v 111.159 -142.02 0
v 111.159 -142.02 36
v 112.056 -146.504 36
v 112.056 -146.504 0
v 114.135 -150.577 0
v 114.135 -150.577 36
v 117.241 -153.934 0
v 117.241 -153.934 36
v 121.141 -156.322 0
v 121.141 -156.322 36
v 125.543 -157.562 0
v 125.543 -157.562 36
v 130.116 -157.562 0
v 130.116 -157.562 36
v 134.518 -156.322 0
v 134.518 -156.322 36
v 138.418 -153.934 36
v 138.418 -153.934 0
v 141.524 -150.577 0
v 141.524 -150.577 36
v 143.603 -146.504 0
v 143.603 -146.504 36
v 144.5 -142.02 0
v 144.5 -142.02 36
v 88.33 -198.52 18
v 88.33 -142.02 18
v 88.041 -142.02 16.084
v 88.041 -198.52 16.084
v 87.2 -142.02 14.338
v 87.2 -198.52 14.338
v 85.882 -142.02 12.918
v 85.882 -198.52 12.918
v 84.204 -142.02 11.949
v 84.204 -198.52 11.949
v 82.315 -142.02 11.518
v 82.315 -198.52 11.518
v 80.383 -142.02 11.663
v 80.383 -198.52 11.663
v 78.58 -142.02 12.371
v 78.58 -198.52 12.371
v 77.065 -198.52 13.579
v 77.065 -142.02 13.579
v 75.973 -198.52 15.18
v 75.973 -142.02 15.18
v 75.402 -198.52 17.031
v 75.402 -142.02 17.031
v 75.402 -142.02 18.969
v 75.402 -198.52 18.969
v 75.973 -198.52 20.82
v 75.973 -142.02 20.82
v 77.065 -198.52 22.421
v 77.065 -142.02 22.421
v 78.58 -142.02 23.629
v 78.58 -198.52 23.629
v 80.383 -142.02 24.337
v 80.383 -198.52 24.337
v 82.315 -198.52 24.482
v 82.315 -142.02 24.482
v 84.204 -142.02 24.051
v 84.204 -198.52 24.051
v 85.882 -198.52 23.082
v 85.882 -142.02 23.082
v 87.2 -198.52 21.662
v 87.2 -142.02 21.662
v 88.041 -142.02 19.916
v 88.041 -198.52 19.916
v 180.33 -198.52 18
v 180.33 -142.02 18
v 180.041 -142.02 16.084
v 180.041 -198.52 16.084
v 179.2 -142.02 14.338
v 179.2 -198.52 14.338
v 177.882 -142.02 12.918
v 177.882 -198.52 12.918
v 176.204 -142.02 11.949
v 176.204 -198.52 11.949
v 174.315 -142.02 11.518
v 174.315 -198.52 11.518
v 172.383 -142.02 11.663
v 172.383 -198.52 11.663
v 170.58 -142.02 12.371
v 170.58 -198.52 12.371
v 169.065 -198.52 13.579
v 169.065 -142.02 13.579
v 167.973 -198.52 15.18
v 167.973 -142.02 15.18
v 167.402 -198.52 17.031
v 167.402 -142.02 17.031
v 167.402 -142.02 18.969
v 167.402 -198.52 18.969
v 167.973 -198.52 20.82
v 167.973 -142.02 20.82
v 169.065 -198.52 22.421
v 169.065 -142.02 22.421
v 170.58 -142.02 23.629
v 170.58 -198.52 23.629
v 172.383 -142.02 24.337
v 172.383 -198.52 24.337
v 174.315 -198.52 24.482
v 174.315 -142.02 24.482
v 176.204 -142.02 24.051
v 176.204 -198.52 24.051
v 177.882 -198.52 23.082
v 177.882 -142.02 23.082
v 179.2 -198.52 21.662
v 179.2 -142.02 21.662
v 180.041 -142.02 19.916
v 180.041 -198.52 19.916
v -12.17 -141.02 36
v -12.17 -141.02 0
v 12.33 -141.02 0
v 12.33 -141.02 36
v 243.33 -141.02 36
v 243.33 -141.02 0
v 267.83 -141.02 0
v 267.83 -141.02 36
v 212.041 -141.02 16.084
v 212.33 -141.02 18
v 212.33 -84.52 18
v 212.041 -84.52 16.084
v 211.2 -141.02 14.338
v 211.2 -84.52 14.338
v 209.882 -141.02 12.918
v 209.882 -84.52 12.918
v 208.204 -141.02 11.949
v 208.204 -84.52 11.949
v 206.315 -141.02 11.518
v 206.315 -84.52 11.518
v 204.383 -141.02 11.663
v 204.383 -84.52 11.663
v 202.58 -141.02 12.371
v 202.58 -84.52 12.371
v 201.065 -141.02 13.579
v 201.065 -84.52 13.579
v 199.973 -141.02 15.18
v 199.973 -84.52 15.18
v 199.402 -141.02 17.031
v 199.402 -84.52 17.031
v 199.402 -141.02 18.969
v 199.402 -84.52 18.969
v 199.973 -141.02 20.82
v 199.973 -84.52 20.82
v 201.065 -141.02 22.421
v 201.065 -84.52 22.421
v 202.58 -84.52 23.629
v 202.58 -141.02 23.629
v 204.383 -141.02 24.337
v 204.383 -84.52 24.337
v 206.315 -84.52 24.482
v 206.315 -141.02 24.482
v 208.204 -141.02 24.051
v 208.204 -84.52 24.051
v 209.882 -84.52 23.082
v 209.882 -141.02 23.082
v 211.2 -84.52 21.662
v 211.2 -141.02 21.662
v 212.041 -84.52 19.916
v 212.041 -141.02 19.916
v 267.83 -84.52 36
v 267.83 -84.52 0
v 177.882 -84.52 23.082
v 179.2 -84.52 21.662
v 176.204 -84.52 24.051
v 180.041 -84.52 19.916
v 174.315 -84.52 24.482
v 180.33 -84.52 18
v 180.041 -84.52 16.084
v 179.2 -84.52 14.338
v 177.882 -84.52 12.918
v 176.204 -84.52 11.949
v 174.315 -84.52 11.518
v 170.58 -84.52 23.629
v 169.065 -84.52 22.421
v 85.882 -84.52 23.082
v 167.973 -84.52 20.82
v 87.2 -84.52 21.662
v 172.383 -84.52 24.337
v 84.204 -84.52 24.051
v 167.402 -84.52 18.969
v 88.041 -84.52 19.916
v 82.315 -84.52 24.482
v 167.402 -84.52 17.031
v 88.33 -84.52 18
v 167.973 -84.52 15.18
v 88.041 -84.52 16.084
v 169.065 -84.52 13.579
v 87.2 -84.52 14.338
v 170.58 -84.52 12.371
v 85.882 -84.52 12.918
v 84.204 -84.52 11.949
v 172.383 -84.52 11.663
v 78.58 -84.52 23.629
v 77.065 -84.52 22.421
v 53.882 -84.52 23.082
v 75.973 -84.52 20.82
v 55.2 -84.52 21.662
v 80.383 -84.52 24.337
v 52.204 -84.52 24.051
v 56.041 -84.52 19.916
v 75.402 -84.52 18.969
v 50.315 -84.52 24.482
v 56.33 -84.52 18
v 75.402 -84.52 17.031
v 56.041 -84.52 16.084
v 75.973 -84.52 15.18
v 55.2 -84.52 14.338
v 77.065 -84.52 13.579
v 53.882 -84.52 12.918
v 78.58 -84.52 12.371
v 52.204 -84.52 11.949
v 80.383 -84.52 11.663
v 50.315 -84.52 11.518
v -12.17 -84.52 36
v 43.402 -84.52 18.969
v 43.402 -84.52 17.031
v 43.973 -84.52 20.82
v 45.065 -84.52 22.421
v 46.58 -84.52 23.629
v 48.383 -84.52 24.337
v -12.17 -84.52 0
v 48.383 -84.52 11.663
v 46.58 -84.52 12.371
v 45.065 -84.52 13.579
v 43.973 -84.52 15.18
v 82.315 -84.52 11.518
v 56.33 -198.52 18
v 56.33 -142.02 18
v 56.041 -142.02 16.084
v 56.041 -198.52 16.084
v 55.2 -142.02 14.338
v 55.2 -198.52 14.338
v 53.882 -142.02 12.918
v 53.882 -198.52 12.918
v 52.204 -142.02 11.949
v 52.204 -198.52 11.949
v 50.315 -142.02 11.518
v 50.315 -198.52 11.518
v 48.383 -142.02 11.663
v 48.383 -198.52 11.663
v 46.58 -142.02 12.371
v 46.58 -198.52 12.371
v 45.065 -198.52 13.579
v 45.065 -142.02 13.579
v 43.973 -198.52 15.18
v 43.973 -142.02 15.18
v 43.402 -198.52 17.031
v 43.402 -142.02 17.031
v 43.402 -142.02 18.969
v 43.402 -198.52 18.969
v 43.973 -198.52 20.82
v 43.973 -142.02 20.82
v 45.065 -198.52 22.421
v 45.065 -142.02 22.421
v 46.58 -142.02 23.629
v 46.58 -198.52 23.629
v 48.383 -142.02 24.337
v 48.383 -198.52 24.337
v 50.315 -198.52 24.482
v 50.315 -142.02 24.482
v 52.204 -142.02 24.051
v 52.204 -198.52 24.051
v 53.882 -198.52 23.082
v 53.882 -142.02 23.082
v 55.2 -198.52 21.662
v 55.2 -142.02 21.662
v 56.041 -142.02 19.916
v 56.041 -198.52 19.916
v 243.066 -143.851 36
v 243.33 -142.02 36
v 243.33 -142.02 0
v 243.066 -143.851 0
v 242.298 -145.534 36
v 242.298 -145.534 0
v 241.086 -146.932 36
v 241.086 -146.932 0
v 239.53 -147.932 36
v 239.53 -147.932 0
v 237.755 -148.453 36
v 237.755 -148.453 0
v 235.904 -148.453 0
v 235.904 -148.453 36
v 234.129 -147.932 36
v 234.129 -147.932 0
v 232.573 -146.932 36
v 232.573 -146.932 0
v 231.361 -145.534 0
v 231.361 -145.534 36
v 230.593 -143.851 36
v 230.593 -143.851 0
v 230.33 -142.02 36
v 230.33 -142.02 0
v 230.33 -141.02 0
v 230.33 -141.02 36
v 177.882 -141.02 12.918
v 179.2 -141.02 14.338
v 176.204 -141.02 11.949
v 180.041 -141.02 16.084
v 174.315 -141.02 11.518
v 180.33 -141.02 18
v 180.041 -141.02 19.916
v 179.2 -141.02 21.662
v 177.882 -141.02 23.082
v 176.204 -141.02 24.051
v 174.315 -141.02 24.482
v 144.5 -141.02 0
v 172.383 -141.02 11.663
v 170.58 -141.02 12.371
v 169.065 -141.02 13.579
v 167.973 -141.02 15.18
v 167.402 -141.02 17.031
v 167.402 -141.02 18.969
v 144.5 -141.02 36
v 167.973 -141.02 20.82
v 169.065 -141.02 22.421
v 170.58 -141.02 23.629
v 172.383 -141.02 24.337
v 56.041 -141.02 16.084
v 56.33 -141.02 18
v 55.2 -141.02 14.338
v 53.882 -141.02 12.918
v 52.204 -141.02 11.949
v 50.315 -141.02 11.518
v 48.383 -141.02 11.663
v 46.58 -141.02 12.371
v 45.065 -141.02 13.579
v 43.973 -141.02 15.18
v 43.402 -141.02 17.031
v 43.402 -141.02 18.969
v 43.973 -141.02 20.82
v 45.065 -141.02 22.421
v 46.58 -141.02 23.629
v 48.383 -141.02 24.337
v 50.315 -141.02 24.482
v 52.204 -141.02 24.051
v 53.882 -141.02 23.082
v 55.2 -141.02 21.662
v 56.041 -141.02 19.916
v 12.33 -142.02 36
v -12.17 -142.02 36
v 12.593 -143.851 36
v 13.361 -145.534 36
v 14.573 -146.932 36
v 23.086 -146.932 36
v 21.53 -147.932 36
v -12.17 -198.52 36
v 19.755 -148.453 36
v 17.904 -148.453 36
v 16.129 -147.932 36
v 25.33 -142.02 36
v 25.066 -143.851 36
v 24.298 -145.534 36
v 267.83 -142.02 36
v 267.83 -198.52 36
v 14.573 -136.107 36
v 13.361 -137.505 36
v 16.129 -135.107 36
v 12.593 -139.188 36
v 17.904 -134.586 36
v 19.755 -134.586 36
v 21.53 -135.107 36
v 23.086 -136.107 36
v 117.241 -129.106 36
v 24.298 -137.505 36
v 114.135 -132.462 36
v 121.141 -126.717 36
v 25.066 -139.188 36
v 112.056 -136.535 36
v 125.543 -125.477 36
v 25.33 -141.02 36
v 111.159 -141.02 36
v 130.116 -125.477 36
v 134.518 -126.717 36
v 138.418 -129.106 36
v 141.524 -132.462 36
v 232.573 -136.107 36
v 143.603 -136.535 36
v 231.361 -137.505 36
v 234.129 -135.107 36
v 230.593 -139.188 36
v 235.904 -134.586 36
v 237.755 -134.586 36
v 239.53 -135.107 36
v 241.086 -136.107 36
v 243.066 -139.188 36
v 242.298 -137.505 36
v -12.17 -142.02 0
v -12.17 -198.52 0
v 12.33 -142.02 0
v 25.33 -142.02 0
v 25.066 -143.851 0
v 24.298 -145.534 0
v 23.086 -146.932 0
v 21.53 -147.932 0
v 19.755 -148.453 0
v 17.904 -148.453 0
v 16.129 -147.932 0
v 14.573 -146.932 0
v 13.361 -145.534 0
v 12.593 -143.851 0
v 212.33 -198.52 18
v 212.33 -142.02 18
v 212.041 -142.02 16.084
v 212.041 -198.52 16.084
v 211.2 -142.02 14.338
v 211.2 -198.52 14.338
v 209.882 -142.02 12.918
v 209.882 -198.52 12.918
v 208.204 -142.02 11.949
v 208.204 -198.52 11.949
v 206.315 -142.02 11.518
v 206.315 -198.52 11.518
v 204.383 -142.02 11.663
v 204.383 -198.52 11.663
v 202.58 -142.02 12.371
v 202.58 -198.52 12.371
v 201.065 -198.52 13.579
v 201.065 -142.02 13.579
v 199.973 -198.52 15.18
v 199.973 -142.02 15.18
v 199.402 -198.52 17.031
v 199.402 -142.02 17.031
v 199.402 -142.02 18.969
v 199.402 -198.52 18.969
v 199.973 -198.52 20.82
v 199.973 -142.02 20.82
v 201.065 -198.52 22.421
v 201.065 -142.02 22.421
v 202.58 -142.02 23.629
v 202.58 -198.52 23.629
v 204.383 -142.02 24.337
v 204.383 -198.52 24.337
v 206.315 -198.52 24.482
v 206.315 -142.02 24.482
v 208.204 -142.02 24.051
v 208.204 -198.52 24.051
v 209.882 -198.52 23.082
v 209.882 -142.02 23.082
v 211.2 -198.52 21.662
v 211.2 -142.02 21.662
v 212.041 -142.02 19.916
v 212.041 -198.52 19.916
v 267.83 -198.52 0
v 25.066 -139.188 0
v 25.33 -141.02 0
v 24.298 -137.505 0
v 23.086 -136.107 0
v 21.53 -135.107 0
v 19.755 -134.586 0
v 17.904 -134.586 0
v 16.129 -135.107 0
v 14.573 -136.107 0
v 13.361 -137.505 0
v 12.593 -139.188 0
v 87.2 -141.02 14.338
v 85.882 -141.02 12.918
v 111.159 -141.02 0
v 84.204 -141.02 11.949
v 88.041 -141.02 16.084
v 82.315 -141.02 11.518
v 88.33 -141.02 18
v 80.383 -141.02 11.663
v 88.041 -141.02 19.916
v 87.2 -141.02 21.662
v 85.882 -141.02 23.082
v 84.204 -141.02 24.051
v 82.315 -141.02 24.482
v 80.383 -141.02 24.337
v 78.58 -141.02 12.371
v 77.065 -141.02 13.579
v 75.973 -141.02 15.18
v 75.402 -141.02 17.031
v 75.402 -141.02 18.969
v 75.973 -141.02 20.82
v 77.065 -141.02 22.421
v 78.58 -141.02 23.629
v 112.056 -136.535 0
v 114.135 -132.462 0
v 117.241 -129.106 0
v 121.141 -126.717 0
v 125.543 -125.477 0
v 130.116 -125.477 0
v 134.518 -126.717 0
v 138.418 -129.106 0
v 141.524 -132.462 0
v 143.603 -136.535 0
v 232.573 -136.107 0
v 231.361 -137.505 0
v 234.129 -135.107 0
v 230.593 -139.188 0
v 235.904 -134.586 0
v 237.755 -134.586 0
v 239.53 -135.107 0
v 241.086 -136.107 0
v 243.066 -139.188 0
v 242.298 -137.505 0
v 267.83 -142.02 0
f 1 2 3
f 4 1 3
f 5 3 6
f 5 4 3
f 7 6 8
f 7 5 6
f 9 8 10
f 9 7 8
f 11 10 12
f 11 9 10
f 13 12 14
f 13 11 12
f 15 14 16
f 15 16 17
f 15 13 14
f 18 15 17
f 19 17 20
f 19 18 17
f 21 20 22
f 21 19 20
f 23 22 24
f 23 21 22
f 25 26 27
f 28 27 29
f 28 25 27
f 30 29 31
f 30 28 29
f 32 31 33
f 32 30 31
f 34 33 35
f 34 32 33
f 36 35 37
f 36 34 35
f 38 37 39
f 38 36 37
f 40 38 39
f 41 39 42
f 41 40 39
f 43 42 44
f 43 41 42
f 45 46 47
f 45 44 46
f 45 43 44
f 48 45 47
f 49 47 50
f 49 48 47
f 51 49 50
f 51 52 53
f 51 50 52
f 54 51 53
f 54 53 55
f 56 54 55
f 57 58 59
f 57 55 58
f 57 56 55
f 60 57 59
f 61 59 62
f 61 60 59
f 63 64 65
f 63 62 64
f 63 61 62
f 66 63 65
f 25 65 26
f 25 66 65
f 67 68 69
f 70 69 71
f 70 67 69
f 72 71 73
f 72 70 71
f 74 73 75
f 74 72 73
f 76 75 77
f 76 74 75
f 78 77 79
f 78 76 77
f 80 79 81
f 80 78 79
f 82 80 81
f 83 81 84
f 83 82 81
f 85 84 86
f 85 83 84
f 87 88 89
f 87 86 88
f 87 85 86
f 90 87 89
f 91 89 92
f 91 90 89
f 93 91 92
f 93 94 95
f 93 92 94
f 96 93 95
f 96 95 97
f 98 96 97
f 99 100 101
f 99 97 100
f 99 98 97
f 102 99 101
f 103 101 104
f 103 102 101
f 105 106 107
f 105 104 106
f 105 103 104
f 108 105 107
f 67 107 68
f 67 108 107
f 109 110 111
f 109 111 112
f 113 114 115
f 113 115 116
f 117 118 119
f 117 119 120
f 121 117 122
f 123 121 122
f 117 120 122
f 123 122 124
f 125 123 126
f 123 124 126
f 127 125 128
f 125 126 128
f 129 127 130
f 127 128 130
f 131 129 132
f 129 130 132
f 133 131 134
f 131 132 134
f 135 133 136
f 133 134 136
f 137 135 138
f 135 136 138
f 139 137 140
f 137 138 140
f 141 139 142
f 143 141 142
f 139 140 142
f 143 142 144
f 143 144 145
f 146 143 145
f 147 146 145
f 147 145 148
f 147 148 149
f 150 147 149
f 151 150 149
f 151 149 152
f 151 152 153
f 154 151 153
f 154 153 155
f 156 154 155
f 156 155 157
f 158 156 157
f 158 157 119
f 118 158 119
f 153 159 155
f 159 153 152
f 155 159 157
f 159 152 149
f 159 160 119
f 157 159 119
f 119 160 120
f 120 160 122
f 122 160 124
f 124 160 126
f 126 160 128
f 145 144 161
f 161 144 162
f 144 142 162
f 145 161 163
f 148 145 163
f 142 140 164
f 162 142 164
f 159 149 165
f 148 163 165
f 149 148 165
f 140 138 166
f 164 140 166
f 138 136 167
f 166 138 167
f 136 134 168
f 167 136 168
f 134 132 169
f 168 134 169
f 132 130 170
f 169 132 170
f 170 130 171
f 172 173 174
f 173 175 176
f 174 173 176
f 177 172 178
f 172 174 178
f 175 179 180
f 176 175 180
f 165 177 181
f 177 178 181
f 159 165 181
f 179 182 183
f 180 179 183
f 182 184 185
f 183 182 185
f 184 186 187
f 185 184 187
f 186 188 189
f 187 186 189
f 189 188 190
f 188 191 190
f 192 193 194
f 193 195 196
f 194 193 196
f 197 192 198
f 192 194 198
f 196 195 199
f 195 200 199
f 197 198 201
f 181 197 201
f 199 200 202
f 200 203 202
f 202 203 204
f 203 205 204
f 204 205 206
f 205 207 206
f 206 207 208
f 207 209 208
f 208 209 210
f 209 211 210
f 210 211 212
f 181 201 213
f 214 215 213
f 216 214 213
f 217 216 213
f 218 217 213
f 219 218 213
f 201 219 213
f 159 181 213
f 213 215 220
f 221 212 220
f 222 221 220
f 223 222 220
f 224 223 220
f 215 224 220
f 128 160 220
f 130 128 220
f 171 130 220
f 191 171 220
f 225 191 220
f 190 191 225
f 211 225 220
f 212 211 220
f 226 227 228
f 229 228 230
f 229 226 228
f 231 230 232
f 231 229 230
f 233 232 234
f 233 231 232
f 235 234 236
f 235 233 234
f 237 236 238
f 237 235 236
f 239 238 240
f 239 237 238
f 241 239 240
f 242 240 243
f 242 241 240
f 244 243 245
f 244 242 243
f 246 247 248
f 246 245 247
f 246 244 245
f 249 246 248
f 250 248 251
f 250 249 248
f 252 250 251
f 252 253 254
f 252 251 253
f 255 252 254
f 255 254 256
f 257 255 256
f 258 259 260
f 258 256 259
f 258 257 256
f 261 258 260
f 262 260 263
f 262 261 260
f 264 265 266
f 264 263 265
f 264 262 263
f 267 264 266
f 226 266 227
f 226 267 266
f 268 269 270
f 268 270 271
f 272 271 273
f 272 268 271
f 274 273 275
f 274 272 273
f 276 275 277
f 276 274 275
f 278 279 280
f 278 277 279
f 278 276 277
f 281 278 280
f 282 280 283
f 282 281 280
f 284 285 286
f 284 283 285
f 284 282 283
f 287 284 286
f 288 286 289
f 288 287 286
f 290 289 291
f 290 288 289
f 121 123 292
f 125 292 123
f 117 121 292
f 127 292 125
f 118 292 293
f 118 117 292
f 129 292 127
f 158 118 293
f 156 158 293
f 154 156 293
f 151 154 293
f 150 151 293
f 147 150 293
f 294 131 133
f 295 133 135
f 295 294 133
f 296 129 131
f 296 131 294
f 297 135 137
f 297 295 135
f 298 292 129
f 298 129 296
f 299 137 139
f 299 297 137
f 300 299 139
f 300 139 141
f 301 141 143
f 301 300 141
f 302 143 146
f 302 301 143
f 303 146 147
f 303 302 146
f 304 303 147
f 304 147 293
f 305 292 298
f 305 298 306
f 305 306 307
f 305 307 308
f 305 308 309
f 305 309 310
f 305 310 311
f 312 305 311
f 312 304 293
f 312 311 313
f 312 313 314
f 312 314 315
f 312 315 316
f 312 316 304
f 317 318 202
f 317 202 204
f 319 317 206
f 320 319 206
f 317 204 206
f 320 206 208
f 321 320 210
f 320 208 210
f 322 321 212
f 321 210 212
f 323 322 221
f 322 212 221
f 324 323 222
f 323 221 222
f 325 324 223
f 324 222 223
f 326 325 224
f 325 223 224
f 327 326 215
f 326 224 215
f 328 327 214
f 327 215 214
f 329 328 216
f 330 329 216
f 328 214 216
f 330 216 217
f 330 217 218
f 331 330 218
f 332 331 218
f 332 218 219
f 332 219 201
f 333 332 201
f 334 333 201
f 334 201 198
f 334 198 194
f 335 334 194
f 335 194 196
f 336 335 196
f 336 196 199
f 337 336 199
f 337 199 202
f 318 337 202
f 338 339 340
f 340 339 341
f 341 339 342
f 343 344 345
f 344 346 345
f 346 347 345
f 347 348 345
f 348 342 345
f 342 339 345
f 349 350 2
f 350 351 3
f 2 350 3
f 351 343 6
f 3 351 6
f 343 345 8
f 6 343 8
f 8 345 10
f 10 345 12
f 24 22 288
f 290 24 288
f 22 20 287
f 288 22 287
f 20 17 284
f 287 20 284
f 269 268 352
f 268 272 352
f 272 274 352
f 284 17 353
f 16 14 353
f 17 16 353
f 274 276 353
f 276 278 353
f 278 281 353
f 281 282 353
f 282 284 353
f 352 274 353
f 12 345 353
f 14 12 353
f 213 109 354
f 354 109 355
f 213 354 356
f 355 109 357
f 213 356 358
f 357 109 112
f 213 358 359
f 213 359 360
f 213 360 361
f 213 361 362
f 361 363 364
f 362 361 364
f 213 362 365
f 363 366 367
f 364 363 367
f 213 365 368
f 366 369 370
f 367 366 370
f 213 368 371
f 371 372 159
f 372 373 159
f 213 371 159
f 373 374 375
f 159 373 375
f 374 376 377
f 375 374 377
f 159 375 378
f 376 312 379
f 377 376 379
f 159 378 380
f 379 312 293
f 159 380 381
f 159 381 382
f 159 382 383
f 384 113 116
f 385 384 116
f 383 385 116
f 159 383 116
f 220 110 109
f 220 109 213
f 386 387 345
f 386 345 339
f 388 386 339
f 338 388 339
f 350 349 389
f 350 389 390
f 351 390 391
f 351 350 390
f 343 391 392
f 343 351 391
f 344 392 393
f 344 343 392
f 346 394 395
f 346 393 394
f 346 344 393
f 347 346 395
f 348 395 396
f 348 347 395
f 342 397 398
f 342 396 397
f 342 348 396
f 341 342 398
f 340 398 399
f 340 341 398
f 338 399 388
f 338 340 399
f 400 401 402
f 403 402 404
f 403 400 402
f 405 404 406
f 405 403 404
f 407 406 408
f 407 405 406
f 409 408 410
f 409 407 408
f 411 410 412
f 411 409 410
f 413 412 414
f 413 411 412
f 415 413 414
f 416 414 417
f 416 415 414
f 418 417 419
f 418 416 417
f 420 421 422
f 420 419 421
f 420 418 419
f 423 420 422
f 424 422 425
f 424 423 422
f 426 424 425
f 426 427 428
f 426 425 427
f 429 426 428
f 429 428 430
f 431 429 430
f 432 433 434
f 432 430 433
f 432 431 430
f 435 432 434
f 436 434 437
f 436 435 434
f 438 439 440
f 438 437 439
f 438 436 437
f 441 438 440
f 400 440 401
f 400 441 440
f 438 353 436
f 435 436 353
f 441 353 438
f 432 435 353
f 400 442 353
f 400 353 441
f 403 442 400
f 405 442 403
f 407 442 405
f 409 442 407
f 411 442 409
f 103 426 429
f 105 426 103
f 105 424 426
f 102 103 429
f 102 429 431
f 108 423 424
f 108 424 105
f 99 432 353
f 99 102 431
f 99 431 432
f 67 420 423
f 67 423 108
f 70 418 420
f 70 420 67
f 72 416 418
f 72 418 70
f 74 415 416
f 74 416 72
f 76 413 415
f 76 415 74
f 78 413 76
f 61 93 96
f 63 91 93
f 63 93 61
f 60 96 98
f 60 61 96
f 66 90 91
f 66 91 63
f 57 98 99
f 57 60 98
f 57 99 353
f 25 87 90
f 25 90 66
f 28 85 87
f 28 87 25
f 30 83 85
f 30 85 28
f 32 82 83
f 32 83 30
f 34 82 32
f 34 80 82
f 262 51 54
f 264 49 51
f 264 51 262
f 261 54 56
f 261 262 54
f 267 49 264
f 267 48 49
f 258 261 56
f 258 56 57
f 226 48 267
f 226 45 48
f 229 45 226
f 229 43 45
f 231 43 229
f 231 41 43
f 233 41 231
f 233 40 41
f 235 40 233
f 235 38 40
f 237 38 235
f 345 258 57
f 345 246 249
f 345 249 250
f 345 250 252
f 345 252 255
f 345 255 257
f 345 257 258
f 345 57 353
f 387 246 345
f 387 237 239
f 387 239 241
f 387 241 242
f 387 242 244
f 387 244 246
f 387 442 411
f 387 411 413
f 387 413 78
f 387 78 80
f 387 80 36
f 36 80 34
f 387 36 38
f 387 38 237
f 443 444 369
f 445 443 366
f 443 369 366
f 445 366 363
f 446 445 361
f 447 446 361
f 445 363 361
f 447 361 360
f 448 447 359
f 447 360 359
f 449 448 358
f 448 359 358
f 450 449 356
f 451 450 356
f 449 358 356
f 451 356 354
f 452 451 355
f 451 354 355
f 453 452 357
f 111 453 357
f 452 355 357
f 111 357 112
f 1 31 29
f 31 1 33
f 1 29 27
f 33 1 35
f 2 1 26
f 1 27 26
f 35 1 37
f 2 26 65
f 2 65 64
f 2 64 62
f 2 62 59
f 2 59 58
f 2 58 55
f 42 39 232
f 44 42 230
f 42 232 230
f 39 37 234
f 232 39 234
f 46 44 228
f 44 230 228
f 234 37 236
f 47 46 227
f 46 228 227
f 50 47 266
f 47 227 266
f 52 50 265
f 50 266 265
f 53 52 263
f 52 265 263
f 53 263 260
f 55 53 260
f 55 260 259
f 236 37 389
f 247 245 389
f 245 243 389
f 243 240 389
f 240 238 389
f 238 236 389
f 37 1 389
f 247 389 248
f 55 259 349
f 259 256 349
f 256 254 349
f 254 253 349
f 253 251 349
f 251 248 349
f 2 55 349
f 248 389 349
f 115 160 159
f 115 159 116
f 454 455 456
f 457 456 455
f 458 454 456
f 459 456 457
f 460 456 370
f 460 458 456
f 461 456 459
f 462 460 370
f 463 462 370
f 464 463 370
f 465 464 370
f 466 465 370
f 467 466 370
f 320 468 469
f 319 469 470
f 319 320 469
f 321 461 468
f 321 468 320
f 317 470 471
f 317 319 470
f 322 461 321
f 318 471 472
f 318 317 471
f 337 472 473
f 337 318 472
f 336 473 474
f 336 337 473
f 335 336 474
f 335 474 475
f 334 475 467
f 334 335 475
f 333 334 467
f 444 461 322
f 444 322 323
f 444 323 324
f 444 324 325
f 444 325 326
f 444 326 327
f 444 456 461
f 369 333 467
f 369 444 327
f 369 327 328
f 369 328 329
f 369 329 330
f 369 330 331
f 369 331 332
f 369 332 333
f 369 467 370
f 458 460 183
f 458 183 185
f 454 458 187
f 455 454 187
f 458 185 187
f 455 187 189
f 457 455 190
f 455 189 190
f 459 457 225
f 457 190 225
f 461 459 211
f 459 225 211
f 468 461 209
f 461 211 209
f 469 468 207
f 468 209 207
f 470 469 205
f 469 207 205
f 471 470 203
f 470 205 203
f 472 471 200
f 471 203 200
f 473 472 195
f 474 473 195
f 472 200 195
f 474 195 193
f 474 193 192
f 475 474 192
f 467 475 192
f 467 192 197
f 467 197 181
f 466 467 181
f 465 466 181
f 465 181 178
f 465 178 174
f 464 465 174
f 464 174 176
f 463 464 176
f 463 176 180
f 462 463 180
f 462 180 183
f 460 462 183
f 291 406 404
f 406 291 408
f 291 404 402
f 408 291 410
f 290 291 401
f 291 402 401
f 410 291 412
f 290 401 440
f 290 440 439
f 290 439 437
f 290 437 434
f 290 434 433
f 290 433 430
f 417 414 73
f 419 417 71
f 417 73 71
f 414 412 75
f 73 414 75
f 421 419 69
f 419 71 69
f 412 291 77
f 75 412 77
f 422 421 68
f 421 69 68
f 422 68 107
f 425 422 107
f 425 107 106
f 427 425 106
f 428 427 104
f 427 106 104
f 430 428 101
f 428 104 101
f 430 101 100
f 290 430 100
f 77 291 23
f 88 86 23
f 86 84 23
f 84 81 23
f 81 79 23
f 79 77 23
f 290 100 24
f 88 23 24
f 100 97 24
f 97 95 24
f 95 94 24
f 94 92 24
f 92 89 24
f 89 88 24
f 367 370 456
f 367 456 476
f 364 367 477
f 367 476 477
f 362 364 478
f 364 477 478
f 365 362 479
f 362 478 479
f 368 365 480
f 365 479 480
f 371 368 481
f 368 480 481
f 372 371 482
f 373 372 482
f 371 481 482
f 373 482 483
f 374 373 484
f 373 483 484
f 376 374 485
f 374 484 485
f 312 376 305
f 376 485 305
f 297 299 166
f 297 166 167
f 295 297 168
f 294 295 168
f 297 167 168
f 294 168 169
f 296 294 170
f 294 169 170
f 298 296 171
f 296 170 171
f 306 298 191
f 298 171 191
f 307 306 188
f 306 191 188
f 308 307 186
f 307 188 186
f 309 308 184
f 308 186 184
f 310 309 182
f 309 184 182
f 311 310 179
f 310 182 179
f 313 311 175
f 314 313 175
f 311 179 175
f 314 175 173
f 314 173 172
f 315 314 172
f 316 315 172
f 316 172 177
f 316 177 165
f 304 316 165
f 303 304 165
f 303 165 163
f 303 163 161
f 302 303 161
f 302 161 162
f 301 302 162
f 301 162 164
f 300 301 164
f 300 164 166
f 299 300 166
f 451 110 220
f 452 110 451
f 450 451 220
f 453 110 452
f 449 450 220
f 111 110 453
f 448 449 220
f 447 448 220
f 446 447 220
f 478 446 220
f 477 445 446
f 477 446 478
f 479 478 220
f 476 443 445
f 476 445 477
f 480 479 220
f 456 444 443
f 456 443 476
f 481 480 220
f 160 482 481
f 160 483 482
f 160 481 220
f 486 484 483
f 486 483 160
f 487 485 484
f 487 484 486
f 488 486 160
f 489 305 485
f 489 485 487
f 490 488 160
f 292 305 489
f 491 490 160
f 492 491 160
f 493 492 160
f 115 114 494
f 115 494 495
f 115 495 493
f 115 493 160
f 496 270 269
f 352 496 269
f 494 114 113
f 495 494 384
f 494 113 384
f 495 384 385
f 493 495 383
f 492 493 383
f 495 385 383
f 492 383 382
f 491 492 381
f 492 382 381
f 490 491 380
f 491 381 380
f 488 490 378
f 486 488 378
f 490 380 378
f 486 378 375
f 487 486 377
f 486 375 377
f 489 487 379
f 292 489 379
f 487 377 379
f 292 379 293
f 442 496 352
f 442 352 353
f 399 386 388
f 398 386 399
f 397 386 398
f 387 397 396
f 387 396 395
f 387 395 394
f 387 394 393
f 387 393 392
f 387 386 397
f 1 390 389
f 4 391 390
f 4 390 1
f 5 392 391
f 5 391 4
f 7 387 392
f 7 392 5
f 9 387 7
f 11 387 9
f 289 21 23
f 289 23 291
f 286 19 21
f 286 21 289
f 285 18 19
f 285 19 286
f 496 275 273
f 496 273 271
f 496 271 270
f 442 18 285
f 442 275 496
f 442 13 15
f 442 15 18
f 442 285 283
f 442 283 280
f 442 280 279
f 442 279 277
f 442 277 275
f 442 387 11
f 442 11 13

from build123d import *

# Parameters (mm, degrees)
BOSS_EXTRUDE1_DEPTH = 36
SKETCH2_W           = 36
SKETCH2_H           = 0.5
CUT_EXTRUDE1_DEPTH  = 281
SKETCH4_R           = 6.5
CUT_EXTRUDE3_DEPTH  = 58
SKETCH5_W           = 36
SKETCH5_H           = 0.5
CUT_EXTRUDE4_DEPTH  = 281
CUT_EXTRUDE5_DEPTH  = 37


with BuildPart() as part:
    # Sketch1 → Boss-Extrude1 (new body)
    with BuildSketch(Plane.XY):
        with BuildLine():
            Line((267.829500207, -84.51965646), (-12.170499793, -84.51965646))
            Line((-12.170499793, -84.51965646), (-12.170499793, -142.01965646))
            Line((-12.170499793, -142.01965646), (111.129500207, -142.01965646))
            ThreePointArc((111.129500207, -142.01965646), (127.829500207, -125.31965646), (144.529500207, -142.01965646))
            Line((144.529500207, -142.01965646), (267.829500207, -142.01965646))
            Line((267.829500207, -142.01965646), (267.829500207, -84.51965646))
        make_face()
    boss_extrude1 = extrude(amount=BOSS_EXTRUDE1_DEPTH)

    # Sketch2 → Cut-Extrude1 (cut, through all)
    with BuildSketch(Plane.ZY.offset(12.170499793)):
        with Locations((18, -141.76965646)):
            Rectangle(SKETCH2_W, SKETCH2_H)
    cut_extrude1 = extrude(amount=-CUT_EXTRUDE1_DEPTH, mode=Mode.SUBTRACT)

    # Sketch4 → Cut-Extrude3 (cut, through all)
    with BuildSketch(Plane(origin=(0, -84.51965646, 0), x_dir=(1, 0, 0), z_dir=(0, 1, 0))):
        with Locations((205.829500207, -18)):
            Circle(SKETCH4_R)
        with Locations((173.829500207, -18)):
            Circle(SKETCH4_R)
        with Locations((81.829500207, -18)):
            Circle(SKETCH4_R)
        with Locations((49.829500207, -18)):
            Circle(SKETCH4_R)
    cut_extrude3 = extrude(amount=-CUT_EXTRUDE3_DEPTH, mode=Mode.SUBTRACT)

    # Mirror1: Boss-Extrude1, Cut-Extrude1, Cut-Extrude3 across plane
    add(boss_extrude1.mirror(Plane(origin=(267.829500207, -141.51965646, 0), x_dir=(0, 0, 1), z_dir=(0, 1, 0))))
    add(cut_extrude1.mirror(Plane(origin=(267.829500207, -141.51965646, 0), x_dir=(0, 0, 1), z_dir=(0, 1, 0))), mode=Mode.SUBTRACT)
    add(cut_extrude3.mirror(Plane(origin=(267.829500207, -141.51965646, 0), x_dir=(0, 0, 1), z_dir=(0, 1, 0))), mode=Mode.SUBTRACT)

    # Sketch5 → Cut-Extrude4 (cut, through all)
    with BuildSketch(Plane.ZY.offset(12.170499793)):
        with Locations((18, -141.76965646)):
            Rectangle(SKETCH5_W, SKETCH5_H)
    extrude(amount=-CUT_EXTRUDE4_DEPTH, mode=Mode.SUBTRACT)

    # Sketch3 → Cut-Extrude5 (cut, through all)
    with BuildSketch(Plane.XY.offset(36)):
        with BuildLine():
            ThreePointArc((25.329500207, -141.01965646), (18.829500207, -134.51965646), (12.329500207, -141.01965646))
            Line((12.329500207, -141.01965646), (25.329500207, -141.01965646))
        make_face()
        with BuildLine():
            ThreePointArc((243.329500207, -141.01965646), (236.829500207, -134.51965646), (230.329500207, -141.01965646))
            Line((230.329500207, -141.01965646), (243.329500207, -141.01965646))
        make_face()
        with BuildLine():
            Line((12.329500207, -142.01965646), (25.329500207, -142.01965646))
            ThreePointArc((25.329500207, -142.01965646), (18.829500207, -148.51965646), (12.329500207, -142.01965646))
        make_face()
        with BuildLine():
            Line((230.329500207, -142.01965646), (243.329500207, -142.01965646))
            ThreePointArc((243.329500207, -142.01965646), (236.829500207, -148.51965646), (230.329500207, -142.01965646))
        make_face()
    extrude(amount=-CUT_EXTRUDE5_DEPTH, mode=Mode.SUBTRACT)


solid = part.part
